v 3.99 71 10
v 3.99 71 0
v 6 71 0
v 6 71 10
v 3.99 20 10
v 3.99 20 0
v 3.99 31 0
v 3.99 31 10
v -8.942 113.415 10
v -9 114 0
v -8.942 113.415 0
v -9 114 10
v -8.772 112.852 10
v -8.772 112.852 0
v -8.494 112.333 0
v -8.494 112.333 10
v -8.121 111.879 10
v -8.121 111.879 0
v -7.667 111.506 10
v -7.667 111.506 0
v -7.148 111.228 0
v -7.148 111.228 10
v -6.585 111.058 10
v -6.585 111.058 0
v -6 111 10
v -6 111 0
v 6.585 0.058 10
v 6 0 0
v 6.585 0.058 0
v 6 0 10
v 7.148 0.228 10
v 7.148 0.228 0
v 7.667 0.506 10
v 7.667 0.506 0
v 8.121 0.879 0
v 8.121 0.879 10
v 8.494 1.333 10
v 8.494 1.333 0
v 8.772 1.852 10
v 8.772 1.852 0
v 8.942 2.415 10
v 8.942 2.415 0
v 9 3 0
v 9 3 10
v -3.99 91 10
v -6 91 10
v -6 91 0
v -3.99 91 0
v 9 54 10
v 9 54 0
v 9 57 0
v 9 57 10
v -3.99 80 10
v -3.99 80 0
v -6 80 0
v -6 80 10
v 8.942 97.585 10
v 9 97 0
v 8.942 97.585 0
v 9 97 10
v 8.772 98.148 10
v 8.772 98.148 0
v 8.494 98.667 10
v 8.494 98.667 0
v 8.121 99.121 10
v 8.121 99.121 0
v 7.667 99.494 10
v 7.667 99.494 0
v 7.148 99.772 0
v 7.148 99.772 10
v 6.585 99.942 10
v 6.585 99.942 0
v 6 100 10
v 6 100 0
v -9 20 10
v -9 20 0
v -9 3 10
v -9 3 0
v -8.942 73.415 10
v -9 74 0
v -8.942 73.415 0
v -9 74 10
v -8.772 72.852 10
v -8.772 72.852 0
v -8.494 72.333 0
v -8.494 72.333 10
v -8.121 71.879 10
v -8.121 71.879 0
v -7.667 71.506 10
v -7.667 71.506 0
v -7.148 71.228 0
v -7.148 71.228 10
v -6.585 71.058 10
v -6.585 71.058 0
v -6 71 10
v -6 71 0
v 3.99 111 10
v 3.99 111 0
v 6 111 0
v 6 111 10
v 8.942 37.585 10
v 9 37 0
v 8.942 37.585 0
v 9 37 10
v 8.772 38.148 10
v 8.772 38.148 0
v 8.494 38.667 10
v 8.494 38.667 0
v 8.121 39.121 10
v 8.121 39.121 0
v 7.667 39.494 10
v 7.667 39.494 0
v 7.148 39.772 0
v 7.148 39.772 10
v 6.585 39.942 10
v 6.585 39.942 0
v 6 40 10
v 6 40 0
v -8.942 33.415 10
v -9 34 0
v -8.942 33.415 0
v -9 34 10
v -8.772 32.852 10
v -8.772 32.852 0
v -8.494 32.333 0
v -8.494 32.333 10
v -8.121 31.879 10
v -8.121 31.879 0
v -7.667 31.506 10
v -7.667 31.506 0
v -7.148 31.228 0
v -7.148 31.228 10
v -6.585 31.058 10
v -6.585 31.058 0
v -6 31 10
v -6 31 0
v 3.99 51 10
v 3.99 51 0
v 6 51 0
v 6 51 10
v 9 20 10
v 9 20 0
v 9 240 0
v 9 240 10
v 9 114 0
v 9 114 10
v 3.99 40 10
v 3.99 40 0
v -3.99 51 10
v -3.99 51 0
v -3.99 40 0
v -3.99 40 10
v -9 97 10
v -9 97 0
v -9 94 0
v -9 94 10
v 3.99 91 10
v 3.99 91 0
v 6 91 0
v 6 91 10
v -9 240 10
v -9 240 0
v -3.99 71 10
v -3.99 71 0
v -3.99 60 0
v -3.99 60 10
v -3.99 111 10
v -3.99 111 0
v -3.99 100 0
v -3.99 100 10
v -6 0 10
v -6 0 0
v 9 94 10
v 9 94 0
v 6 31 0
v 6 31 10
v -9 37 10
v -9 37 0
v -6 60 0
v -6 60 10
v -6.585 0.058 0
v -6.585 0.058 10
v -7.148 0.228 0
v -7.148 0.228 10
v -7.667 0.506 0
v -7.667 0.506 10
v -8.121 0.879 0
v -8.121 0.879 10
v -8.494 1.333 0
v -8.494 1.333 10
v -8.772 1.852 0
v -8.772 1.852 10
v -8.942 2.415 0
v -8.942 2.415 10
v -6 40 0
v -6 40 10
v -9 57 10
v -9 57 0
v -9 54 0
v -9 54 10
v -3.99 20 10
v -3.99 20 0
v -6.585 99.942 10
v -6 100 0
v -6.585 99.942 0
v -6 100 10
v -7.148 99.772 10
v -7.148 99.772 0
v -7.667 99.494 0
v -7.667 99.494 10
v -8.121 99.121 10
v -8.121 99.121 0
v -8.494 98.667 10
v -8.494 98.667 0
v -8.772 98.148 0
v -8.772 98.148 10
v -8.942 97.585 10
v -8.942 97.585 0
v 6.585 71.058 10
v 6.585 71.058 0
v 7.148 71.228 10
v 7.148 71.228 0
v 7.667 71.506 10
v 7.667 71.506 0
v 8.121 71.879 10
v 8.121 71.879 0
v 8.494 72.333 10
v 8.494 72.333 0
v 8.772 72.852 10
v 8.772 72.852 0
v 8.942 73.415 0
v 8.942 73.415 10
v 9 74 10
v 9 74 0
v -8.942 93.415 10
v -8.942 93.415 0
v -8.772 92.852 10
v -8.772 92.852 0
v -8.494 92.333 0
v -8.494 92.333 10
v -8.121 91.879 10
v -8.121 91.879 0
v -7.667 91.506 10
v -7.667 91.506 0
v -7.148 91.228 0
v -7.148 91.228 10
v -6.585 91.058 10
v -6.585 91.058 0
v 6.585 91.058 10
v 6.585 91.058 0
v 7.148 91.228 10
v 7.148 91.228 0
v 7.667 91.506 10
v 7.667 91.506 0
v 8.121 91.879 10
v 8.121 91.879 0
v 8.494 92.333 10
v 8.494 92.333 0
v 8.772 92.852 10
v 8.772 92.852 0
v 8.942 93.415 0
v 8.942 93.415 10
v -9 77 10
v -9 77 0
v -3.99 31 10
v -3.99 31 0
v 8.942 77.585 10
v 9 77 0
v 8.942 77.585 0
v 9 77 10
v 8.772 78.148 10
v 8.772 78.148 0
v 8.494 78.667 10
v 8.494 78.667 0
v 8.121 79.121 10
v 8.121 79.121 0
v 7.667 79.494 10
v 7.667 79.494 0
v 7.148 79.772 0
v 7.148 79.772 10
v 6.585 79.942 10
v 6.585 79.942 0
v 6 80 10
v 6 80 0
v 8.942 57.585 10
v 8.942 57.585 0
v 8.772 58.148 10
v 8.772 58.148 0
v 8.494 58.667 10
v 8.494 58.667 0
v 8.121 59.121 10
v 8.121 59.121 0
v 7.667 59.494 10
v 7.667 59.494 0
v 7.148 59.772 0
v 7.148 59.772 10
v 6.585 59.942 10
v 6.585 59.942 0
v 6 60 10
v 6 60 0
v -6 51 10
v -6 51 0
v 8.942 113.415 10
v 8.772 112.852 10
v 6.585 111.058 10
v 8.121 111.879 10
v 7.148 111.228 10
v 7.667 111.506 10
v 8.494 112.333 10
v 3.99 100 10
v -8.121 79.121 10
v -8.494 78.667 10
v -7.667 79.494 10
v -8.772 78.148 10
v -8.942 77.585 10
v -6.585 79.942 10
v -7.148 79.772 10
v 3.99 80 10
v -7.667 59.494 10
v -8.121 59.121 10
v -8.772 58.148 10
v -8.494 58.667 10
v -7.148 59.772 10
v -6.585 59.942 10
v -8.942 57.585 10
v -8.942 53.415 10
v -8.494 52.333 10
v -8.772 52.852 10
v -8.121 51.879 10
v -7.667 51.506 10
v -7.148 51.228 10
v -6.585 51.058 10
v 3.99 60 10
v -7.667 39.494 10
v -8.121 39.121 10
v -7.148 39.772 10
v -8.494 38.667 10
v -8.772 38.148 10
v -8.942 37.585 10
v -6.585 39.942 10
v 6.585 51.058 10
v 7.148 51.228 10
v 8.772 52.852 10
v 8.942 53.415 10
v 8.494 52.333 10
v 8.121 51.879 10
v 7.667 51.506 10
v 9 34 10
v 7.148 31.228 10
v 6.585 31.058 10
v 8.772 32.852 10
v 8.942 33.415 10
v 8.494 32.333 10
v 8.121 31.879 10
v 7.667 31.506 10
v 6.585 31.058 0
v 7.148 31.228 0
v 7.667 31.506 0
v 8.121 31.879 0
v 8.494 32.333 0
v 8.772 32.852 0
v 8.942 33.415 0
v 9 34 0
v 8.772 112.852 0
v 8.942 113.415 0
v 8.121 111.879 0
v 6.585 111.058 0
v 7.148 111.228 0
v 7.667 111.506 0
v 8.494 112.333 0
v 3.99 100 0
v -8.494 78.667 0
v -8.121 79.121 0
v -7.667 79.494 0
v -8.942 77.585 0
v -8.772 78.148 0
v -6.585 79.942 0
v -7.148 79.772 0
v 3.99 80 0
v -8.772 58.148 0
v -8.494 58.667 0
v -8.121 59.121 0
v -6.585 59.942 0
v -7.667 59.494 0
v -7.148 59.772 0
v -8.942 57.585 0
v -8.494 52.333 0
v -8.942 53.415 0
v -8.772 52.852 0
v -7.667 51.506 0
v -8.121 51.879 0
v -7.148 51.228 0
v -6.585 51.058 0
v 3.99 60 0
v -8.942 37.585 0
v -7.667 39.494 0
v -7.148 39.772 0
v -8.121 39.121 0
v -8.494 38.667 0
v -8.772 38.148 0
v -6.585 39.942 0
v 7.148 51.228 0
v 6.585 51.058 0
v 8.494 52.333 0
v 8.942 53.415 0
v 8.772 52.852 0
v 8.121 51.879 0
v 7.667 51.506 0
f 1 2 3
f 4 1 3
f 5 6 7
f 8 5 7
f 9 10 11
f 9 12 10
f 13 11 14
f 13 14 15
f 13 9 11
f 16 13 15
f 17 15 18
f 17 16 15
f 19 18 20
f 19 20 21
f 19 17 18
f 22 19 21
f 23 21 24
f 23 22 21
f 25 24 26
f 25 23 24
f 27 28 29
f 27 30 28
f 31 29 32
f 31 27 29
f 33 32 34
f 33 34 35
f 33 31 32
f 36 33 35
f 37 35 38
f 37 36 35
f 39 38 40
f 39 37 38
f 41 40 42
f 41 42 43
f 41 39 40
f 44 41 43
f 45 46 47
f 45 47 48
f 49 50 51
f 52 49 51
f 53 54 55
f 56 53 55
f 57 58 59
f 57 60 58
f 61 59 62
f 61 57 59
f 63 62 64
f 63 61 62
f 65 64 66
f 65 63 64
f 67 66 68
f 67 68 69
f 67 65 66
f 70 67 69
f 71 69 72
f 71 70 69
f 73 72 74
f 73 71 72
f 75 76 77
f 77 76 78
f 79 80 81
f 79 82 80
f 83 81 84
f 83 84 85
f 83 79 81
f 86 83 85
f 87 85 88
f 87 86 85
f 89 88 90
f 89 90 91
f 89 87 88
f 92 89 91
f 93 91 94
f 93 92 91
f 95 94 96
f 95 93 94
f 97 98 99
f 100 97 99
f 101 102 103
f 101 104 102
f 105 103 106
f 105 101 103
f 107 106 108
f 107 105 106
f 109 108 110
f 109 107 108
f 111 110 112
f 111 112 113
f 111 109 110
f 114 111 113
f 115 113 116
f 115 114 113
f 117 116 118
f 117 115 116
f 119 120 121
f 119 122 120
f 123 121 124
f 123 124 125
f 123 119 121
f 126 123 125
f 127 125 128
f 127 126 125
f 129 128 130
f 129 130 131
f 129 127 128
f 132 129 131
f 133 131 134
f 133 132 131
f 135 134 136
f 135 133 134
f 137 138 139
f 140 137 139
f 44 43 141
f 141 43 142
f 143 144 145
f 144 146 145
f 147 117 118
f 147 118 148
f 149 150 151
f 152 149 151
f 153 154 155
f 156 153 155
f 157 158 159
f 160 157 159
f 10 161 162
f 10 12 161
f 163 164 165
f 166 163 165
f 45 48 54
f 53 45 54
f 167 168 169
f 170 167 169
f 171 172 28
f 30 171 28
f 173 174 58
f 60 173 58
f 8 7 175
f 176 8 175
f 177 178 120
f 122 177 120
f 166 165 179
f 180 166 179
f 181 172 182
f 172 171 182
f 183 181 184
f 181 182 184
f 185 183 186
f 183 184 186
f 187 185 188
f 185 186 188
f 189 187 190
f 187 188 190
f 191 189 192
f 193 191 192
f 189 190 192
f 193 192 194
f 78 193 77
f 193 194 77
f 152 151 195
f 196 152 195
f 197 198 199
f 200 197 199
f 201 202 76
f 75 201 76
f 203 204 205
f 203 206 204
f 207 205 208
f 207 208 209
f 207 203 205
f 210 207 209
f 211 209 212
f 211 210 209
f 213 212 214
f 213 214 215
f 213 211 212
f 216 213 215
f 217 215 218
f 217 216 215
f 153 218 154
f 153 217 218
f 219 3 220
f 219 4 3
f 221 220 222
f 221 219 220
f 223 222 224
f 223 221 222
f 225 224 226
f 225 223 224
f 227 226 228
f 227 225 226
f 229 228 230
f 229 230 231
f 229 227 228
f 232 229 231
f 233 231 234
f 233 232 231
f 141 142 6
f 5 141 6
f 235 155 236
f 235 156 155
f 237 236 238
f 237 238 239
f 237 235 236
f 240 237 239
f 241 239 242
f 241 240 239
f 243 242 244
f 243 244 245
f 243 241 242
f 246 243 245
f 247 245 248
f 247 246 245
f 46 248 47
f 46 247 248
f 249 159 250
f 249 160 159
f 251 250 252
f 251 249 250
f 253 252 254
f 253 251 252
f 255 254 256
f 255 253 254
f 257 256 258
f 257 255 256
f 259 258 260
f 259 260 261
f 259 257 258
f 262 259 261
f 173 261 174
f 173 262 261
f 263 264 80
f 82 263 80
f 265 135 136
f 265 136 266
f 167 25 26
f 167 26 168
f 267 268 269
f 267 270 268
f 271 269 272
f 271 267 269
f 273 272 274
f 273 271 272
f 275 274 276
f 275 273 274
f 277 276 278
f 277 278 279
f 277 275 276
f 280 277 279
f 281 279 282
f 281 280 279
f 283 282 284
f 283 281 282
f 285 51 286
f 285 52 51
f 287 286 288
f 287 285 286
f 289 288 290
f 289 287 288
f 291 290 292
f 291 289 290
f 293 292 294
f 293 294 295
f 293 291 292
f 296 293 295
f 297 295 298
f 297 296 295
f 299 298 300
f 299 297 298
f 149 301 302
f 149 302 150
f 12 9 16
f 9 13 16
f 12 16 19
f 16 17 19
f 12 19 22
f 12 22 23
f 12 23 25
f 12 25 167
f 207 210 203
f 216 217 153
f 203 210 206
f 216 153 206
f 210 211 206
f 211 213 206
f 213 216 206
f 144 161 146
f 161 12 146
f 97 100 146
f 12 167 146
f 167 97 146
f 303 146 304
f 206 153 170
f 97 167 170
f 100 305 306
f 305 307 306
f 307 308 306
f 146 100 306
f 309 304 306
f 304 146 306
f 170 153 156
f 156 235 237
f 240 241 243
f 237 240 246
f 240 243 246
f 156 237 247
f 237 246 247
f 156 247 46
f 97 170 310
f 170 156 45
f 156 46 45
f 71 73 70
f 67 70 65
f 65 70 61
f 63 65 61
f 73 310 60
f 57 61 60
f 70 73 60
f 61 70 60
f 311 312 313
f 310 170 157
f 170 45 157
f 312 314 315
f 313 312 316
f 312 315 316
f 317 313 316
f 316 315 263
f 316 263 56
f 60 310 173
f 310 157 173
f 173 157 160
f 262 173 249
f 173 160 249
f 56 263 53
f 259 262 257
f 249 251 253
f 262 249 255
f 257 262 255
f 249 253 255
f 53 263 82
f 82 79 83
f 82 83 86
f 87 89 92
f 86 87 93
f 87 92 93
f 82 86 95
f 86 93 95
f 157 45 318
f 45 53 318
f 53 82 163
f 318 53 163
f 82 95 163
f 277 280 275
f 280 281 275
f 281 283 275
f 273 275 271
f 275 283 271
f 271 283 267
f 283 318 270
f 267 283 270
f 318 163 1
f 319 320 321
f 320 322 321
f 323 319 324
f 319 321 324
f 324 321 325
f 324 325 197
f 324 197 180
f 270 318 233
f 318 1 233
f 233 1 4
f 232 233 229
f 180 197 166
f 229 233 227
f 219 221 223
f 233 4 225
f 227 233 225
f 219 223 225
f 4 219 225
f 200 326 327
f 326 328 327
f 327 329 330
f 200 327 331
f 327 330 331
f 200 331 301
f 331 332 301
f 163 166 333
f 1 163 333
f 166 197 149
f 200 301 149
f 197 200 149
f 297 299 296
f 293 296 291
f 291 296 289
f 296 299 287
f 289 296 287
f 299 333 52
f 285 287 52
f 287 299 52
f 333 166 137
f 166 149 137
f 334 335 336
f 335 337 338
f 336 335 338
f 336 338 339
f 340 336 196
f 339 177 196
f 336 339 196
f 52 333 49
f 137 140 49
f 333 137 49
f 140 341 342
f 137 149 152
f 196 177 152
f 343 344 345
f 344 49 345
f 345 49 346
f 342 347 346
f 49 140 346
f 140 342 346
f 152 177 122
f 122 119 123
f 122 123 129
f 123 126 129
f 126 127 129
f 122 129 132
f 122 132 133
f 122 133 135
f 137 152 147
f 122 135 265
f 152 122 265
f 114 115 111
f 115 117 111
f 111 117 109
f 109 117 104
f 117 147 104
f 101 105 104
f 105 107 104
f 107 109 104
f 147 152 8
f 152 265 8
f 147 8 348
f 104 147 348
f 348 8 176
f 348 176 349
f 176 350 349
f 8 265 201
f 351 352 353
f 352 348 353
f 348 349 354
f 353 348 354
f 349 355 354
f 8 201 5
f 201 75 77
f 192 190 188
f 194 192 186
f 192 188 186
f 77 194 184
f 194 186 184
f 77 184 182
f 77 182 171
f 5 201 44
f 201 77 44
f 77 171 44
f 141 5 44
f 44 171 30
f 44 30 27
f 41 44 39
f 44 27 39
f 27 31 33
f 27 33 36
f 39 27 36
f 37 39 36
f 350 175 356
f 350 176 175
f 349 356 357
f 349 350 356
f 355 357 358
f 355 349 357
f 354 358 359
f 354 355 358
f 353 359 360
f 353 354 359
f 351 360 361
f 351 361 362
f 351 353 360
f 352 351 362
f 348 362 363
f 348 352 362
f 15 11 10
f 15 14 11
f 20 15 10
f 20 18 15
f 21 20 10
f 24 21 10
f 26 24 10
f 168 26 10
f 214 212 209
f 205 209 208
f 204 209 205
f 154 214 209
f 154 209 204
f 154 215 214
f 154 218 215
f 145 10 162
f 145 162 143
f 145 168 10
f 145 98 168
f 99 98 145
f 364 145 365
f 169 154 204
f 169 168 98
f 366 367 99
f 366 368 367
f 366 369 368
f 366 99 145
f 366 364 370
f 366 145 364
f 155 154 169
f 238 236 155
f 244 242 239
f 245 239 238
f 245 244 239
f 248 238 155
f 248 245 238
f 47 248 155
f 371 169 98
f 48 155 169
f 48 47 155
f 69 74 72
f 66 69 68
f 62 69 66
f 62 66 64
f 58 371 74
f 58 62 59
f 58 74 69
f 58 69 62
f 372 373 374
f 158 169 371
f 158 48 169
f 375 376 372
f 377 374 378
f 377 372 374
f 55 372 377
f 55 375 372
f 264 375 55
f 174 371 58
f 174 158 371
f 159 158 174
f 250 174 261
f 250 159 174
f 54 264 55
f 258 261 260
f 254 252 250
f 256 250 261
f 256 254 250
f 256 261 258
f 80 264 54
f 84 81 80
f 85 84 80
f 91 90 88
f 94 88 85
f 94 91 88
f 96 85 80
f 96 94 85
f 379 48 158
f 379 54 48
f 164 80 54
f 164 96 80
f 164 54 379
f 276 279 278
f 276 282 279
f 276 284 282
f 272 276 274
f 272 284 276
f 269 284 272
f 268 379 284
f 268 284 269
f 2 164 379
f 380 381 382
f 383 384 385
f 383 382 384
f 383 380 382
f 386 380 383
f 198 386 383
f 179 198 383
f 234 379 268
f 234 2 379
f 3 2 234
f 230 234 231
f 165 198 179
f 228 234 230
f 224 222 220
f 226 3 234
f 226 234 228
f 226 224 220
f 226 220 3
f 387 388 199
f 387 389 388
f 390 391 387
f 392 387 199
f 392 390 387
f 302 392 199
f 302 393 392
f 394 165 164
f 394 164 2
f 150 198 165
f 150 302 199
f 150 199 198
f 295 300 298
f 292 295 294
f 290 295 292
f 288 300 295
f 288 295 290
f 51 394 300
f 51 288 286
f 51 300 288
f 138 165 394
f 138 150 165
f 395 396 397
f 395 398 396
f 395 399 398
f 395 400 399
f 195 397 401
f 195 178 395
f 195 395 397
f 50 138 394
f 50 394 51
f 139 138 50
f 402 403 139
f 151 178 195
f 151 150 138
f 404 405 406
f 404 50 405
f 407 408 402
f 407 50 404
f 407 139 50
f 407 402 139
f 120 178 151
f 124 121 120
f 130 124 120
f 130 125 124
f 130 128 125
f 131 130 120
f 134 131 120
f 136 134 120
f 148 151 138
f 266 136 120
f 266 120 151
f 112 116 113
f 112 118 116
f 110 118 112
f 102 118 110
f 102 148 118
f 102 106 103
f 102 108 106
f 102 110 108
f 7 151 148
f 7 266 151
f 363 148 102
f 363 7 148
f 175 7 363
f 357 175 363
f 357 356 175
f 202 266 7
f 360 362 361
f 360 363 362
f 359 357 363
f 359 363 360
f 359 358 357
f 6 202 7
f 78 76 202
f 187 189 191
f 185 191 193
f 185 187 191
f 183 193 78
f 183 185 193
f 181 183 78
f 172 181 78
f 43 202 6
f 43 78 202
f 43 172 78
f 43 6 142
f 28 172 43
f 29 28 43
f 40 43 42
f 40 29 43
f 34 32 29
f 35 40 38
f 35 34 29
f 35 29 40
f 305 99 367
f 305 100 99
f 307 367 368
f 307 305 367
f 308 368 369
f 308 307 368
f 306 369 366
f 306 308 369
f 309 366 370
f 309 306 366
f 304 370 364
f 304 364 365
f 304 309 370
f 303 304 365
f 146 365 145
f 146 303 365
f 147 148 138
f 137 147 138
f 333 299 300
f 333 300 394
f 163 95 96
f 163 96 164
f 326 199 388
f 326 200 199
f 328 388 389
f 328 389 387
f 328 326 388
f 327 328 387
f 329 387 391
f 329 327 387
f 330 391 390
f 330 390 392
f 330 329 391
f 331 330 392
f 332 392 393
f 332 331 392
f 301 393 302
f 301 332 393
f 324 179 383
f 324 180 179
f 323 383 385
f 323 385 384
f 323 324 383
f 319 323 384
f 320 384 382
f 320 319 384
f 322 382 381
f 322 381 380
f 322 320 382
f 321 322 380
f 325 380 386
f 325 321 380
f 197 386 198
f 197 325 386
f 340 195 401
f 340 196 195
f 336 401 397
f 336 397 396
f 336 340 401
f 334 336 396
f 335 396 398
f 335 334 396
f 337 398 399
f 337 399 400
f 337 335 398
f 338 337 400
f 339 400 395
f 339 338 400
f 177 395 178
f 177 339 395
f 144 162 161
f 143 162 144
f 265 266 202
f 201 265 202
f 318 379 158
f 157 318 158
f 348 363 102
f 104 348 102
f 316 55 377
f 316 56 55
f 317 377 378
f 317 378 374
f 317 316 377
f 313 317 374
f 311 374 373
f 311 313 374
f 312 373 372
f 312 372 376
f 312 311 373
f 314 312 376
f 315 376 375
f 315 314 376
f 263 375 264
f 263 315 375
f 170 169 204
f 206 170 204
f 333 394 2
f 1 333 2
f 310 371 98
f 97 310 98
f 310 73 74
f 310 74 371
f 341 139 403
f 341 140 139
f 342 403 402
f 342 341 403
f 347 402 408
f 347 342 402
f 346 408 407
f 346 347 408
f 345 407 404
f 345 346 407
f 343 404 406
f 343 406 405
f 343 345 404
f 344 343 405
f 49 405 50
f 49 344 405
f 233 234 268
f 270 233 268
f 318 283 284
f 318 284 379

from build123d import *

# Parameters (mm, degrees)
BOSS_EXTRUDE1_DEPTH = 10
FILLET1_R           = 3
SKETCH2_W           = 18
SKETCH2_H           = 10
BOSS_EXTRUDE2_DEPTH = 120


with BuildPart() as part:
    # Sketch1 → Boss-Extrude1 (new body)
    with BuildSketch(Plane.XY):
        Polygon((-9, 0), (9, 0), (9, 20), (3.99, 20), (3.99, 31), (9, 31), (9, 40), (3.99, 40), (3.99, 51), (9, 51), (9, 60), (3.99, 60), (3.99, 71), (9, 71), (9, 80), (3.99, 80), (3.99, 91), (9, 91), (9, 100), (3.99, 100), (3.99, 111), (9, 111), (9, 120), (3.99, 120), (-3.99, 120), (-9, 120), (-9, 111), (-3.99, 111), (-3.99, 100), (-9, 100), (-9, 91), (-3.99, 91), (-3.99, 80), (-9, 80), (-9, 71), (-3.99, 71), (-3.99, 60), (-9, 60), (-9, 51), (-3.99, 51), (-3.99, 40), (-9, 40), (-9, 31), (-3.99, 31), (-3.99, 20), (-9, 20), align=None)
    extrude(amount=BOSS_EXTRUDE1_DEPTH)

    # Fillet1
    fillet1_edges = [part.edges().sort_by_distance(p)[0] for p in [
        (-9, 31, 5),
        (-9, 40, 5),
        (-9, 51, 5),
        (-9, 60, 5),
        (-9, 71, 5),
        (-9, 80, 5),
        (-9, 91, 5),
        (-9, 100, 5),
        (-9, 111, 5),
        (9, 111, 5),
        (9, 100, 5),
        (9, 91, 5),
        (9, 80, 5),
        (9, 71, 5),
        (9, 60, 5),
        (9, 51, 5),
        (9, 40, 5),
        (9, 31, 5),
        (9, 0, 5),
        (-9, 0, 5),
    ]]
    fillet(fillet1_edges, radius=FILLET1_R)

    # Sketch2 → Boss-Extrude2 (add)
    with BuildSketch(Plane(origin=(0, 120, 0), x_dir=(1, 0, 0), z_dir=(0, 1, 0))):
        with Locations((0, -5)):
            Rectangle(SKETCH2_W, SKETCH2_H)
    extrude(amount=BOSS_EXTRUDE2_DEPTH)


solid = part.part
